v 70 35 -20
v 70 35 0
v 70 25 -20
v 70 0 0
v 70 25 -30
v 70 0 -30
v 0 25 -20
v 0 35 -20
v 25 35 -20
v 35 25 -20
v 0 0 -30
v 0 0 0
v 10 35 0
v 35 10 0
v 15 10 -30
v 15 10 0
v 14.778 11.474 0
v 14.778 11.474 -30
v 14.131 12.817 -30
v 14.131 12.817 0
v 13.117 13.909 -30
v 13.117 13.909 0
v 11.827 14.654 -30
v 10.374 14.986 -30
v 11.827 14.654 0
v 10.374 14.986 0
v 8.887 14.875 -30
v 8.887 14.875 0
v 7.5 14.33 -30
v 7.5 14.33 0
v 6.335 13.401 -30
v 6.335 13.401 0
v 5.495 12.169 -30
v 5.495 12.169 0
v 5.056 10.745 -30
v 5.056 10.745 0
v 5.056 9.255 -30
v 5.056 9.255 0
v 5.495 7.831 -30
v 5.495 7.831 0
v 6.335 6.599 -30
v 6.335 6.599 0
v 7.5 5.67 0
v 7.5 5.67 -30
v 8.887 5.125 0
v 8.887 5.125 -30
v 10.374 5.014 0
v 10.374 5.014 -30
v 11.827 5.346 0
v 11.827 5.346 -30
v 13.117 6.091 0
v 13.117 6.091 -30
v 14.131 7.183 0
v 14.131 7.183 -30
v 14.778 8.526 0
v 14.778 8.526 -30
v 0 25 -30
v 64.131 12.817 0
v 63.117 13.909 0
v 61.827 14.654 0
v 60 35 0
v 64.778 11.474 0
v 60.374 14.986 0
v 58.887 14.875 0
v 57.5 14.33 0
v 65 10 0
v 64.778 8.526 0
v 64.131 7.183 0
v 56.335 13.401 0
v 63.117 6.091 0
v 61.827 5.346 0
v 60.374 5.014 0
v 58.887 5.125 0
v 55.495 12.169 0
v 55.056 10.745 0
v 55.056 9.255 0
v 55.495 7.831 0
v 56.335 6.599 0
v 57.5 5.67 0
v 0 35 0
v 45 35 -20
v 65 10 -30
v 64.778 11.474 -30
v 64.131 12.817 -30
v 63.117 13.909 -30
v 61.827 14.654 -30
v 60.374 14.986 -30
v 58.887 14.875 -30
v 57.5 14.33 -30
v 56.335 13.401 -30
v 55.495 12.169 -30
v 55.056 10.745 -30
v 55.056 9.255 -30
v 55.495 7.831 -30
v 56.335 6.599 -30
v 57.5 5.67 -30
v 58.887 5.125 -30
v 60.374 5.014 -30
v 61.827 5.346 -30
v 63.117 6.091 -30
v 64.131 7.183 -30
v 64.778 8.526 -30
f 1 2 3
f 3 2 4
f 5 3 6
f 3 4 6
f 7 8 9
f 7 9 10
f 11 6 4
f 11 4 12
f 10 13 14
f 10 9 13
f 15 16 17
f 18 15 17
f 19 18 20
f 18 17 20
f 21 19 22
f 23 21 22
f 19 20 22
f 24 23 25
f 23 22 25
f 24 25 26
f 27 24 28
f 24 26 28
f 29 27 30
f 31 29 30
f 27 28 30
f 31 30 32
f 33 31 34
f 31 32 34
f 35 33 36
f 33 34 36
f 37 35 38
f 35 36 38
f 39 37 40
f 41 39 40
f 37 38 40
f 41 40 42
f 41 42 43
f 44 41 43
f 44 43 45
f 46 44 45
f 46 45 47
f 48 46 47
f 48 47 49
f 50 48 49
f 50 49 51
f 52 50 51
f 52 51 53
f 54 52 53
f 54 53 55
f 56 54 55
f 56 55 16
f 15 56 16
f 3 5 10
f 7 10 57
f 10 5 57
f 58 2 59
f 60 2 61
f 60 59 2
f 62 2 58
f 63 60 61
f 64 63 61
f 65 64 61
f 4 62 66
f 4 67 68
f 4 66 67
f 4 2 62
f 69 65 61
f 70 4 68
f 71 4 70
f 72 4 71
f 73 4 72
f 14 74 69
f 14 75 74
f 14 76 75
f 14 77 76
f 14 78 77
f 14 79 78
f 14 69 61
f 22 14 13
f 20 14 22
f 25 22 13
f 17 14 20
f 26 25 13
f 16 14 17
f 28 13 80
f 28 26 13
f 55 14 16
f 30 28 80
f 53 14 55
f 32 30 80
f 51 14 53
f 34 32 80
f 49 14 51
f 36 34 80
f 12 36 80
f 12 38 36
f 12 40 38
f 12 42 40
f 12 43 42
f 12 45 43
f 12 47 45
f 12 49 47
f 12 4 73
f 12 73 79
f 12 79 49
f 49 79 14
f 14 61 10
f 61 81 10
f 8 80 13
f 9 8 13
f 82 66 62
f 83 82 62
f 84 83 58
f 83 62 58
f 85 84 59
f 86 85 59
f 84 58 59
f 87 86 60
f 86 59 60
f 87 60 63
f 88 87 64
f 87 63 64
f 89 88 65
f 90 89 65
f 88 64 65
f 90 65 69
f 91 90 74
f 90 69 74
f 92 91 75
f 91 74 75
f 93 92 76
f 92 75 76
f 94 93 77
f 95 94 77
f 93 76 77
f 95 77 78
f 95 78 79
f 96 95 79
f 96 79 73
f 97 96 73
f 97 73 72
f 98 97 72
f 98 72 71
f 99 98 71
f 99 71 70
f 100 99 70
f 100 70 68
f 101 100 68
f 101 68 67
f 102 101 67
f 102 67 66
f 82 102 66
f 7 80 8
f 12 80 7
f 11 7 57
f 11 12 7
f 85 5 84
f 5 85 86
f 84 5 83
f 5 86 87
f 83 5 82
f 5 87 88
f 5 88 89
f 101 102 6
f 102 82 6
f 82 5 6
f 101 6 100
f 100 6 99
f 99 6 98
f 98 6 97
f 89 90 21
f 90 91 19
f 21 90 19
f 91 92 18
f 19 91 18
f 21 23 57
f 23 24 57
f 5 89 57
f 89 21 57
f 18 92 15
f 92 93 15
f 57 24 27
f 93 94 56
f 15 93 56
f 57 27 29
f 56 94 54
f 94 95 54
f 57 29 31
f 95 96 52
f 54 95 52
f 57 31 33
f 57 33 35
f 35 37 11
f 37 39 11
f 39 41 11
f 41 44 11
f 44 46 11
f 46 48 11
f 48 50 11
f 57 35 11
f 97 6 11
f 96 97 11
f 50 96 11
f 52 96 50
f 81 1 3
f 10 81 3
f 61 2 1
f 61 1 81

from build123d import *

# Parameters (mm, degrees)
SKETCH1_W           = 35
SKETCH1_H           = 30
BOSS_EXTRUDE1_DEPTH = 35
SKETCH2_W           = 35
SKETCH2_H           = 10
CUT_EXTRUDE1_DEPTH  = 10
CUT_EXTRUDE3_DEPTH  = 16.617376189
CUT_EXTRUDE4_DEPTH  = 21
CUT_EXTRUDE5_DEPTH  = 19
SKETCH13_R          = 5
CUT_EXTRUDE6_DEPTH  = 31
SKETCH14_R          = 5
CUT_EXTRUDE7_DEPTH  = 31


with BuildPart() as part:
    # Sketch1 → Boss-Extrude1 (new body)
    with BuildSketch(Plane(origin=(0, 0, 0), x_dir=(1, 0, 0), z_dir=(0, 1, 0))):
        with Locations((17.5, 15)):
            Rectangle(SKETCH1_W, SKETCH1_H)
    boss_extrude1 = extrude(amount=BOSS_EXTRUDE1_DEPTH)

    # Sketch2 → Cut-Extrude1 (cut)
    with BuildSketch(Plane(origin=(0, 35, 0), x_dir=(1, 0, 0), z_dir=(0, 1, 0))):
        with Locations((17.5, 25)):
            Rectangle(SKETCH2_W, SKETCH2_H)
    cut_extrude1 = extrude(amount=-CUT_EXTRUDE1_DEPTH, mode=Mode.SUBTRACT)

    # Sketch8 → Cut-Extrude3 (cut, through all)
    with BuildSketch(Plane(origin=(17.56097561, 17.56097561, 13.170731707), x_dir=(0.780868809, -0.499756038, -0.374817029), z_dir=(0.624695048, 0.624695048, 0.468521286))):
        Polygon((-9.682773237, 21), (22.33284795, 6), (22.33284795, 31), (9.526599475, 37), align=None)
    cut_extrude3 = extrude(amount=CUT_EXTRUDE3_DEPTH, mode=Mode.SUBTRACT)

    # Sketch10 → Cut-Extrude4 (cut, through all)
    with BuildSketch(Plane(origin=(0, 0, -20), x_dir=(-1, 0, 0), z_dir=(0, 0, -1))):
        Polygon((-35, 35), (-25, 35), (-35, 25), align=None)
    extrude(amount=-CUT_EXTRUDE4_DEPTH, mode=Mode.SUBTRACT)

    # Mirror5: Boss-Extrude1, Cut-Extrude1, Cut-Extrude3 across plane
    add(boss_extrude1.mirror(Plane(origin=(35, 35, 0), x_dir=(0, 0, 1), z_dir=(-1, 0, 0))))
    add(cut_extrude1.mirror(Plane(origin=(35, 35, 0), x_dir=(0, 0, 1), z_dir=(-1, 0, 0))), mode=Mode.SUBTRACT)
    add(cut_extrude3.mirror(Plane(origin=(35, 35, 0), x_dir=(0, 0, 1), z_dir=(-1, 0, 0))), mode=Mode.SUBTRACT)

    # Sketch12 → Cut-Extrude5 (cut)
    with BuildSketch(Plane(origin=(0, 0, -20), x_dir=(-1, 0, 0), z_dir=(0, 0, -1))):
        Polygon((-45, 35), (-35, 25), (-35, 35), align=None)
    extrude(amount=-CUT_EXTRUDE5_DEPTH, mode=Mode.SUBTRACT)

    # Sketch13 → Cut-Extrude6 (cut, through all)
    with BuildSketch(Plane.XY):
        with Locations((10, 10)):
            Circle(SKETCH13_R)
    extrude(amount=-CUT_EXTRUDE6_DEPTH, mode=Mode.SUBTRACT)

    # Sketch14 → Cut-Extrude7 (cut, through all)
    with BuildSketch(Plane.XY):
        with Locations((60, 10)):
            Circle(SKETCH14_R)
    extrude(amount=-CUT_EXTRUDE7_DEPTH, mode=Mode.SUBTRACT)


solid = part.part
